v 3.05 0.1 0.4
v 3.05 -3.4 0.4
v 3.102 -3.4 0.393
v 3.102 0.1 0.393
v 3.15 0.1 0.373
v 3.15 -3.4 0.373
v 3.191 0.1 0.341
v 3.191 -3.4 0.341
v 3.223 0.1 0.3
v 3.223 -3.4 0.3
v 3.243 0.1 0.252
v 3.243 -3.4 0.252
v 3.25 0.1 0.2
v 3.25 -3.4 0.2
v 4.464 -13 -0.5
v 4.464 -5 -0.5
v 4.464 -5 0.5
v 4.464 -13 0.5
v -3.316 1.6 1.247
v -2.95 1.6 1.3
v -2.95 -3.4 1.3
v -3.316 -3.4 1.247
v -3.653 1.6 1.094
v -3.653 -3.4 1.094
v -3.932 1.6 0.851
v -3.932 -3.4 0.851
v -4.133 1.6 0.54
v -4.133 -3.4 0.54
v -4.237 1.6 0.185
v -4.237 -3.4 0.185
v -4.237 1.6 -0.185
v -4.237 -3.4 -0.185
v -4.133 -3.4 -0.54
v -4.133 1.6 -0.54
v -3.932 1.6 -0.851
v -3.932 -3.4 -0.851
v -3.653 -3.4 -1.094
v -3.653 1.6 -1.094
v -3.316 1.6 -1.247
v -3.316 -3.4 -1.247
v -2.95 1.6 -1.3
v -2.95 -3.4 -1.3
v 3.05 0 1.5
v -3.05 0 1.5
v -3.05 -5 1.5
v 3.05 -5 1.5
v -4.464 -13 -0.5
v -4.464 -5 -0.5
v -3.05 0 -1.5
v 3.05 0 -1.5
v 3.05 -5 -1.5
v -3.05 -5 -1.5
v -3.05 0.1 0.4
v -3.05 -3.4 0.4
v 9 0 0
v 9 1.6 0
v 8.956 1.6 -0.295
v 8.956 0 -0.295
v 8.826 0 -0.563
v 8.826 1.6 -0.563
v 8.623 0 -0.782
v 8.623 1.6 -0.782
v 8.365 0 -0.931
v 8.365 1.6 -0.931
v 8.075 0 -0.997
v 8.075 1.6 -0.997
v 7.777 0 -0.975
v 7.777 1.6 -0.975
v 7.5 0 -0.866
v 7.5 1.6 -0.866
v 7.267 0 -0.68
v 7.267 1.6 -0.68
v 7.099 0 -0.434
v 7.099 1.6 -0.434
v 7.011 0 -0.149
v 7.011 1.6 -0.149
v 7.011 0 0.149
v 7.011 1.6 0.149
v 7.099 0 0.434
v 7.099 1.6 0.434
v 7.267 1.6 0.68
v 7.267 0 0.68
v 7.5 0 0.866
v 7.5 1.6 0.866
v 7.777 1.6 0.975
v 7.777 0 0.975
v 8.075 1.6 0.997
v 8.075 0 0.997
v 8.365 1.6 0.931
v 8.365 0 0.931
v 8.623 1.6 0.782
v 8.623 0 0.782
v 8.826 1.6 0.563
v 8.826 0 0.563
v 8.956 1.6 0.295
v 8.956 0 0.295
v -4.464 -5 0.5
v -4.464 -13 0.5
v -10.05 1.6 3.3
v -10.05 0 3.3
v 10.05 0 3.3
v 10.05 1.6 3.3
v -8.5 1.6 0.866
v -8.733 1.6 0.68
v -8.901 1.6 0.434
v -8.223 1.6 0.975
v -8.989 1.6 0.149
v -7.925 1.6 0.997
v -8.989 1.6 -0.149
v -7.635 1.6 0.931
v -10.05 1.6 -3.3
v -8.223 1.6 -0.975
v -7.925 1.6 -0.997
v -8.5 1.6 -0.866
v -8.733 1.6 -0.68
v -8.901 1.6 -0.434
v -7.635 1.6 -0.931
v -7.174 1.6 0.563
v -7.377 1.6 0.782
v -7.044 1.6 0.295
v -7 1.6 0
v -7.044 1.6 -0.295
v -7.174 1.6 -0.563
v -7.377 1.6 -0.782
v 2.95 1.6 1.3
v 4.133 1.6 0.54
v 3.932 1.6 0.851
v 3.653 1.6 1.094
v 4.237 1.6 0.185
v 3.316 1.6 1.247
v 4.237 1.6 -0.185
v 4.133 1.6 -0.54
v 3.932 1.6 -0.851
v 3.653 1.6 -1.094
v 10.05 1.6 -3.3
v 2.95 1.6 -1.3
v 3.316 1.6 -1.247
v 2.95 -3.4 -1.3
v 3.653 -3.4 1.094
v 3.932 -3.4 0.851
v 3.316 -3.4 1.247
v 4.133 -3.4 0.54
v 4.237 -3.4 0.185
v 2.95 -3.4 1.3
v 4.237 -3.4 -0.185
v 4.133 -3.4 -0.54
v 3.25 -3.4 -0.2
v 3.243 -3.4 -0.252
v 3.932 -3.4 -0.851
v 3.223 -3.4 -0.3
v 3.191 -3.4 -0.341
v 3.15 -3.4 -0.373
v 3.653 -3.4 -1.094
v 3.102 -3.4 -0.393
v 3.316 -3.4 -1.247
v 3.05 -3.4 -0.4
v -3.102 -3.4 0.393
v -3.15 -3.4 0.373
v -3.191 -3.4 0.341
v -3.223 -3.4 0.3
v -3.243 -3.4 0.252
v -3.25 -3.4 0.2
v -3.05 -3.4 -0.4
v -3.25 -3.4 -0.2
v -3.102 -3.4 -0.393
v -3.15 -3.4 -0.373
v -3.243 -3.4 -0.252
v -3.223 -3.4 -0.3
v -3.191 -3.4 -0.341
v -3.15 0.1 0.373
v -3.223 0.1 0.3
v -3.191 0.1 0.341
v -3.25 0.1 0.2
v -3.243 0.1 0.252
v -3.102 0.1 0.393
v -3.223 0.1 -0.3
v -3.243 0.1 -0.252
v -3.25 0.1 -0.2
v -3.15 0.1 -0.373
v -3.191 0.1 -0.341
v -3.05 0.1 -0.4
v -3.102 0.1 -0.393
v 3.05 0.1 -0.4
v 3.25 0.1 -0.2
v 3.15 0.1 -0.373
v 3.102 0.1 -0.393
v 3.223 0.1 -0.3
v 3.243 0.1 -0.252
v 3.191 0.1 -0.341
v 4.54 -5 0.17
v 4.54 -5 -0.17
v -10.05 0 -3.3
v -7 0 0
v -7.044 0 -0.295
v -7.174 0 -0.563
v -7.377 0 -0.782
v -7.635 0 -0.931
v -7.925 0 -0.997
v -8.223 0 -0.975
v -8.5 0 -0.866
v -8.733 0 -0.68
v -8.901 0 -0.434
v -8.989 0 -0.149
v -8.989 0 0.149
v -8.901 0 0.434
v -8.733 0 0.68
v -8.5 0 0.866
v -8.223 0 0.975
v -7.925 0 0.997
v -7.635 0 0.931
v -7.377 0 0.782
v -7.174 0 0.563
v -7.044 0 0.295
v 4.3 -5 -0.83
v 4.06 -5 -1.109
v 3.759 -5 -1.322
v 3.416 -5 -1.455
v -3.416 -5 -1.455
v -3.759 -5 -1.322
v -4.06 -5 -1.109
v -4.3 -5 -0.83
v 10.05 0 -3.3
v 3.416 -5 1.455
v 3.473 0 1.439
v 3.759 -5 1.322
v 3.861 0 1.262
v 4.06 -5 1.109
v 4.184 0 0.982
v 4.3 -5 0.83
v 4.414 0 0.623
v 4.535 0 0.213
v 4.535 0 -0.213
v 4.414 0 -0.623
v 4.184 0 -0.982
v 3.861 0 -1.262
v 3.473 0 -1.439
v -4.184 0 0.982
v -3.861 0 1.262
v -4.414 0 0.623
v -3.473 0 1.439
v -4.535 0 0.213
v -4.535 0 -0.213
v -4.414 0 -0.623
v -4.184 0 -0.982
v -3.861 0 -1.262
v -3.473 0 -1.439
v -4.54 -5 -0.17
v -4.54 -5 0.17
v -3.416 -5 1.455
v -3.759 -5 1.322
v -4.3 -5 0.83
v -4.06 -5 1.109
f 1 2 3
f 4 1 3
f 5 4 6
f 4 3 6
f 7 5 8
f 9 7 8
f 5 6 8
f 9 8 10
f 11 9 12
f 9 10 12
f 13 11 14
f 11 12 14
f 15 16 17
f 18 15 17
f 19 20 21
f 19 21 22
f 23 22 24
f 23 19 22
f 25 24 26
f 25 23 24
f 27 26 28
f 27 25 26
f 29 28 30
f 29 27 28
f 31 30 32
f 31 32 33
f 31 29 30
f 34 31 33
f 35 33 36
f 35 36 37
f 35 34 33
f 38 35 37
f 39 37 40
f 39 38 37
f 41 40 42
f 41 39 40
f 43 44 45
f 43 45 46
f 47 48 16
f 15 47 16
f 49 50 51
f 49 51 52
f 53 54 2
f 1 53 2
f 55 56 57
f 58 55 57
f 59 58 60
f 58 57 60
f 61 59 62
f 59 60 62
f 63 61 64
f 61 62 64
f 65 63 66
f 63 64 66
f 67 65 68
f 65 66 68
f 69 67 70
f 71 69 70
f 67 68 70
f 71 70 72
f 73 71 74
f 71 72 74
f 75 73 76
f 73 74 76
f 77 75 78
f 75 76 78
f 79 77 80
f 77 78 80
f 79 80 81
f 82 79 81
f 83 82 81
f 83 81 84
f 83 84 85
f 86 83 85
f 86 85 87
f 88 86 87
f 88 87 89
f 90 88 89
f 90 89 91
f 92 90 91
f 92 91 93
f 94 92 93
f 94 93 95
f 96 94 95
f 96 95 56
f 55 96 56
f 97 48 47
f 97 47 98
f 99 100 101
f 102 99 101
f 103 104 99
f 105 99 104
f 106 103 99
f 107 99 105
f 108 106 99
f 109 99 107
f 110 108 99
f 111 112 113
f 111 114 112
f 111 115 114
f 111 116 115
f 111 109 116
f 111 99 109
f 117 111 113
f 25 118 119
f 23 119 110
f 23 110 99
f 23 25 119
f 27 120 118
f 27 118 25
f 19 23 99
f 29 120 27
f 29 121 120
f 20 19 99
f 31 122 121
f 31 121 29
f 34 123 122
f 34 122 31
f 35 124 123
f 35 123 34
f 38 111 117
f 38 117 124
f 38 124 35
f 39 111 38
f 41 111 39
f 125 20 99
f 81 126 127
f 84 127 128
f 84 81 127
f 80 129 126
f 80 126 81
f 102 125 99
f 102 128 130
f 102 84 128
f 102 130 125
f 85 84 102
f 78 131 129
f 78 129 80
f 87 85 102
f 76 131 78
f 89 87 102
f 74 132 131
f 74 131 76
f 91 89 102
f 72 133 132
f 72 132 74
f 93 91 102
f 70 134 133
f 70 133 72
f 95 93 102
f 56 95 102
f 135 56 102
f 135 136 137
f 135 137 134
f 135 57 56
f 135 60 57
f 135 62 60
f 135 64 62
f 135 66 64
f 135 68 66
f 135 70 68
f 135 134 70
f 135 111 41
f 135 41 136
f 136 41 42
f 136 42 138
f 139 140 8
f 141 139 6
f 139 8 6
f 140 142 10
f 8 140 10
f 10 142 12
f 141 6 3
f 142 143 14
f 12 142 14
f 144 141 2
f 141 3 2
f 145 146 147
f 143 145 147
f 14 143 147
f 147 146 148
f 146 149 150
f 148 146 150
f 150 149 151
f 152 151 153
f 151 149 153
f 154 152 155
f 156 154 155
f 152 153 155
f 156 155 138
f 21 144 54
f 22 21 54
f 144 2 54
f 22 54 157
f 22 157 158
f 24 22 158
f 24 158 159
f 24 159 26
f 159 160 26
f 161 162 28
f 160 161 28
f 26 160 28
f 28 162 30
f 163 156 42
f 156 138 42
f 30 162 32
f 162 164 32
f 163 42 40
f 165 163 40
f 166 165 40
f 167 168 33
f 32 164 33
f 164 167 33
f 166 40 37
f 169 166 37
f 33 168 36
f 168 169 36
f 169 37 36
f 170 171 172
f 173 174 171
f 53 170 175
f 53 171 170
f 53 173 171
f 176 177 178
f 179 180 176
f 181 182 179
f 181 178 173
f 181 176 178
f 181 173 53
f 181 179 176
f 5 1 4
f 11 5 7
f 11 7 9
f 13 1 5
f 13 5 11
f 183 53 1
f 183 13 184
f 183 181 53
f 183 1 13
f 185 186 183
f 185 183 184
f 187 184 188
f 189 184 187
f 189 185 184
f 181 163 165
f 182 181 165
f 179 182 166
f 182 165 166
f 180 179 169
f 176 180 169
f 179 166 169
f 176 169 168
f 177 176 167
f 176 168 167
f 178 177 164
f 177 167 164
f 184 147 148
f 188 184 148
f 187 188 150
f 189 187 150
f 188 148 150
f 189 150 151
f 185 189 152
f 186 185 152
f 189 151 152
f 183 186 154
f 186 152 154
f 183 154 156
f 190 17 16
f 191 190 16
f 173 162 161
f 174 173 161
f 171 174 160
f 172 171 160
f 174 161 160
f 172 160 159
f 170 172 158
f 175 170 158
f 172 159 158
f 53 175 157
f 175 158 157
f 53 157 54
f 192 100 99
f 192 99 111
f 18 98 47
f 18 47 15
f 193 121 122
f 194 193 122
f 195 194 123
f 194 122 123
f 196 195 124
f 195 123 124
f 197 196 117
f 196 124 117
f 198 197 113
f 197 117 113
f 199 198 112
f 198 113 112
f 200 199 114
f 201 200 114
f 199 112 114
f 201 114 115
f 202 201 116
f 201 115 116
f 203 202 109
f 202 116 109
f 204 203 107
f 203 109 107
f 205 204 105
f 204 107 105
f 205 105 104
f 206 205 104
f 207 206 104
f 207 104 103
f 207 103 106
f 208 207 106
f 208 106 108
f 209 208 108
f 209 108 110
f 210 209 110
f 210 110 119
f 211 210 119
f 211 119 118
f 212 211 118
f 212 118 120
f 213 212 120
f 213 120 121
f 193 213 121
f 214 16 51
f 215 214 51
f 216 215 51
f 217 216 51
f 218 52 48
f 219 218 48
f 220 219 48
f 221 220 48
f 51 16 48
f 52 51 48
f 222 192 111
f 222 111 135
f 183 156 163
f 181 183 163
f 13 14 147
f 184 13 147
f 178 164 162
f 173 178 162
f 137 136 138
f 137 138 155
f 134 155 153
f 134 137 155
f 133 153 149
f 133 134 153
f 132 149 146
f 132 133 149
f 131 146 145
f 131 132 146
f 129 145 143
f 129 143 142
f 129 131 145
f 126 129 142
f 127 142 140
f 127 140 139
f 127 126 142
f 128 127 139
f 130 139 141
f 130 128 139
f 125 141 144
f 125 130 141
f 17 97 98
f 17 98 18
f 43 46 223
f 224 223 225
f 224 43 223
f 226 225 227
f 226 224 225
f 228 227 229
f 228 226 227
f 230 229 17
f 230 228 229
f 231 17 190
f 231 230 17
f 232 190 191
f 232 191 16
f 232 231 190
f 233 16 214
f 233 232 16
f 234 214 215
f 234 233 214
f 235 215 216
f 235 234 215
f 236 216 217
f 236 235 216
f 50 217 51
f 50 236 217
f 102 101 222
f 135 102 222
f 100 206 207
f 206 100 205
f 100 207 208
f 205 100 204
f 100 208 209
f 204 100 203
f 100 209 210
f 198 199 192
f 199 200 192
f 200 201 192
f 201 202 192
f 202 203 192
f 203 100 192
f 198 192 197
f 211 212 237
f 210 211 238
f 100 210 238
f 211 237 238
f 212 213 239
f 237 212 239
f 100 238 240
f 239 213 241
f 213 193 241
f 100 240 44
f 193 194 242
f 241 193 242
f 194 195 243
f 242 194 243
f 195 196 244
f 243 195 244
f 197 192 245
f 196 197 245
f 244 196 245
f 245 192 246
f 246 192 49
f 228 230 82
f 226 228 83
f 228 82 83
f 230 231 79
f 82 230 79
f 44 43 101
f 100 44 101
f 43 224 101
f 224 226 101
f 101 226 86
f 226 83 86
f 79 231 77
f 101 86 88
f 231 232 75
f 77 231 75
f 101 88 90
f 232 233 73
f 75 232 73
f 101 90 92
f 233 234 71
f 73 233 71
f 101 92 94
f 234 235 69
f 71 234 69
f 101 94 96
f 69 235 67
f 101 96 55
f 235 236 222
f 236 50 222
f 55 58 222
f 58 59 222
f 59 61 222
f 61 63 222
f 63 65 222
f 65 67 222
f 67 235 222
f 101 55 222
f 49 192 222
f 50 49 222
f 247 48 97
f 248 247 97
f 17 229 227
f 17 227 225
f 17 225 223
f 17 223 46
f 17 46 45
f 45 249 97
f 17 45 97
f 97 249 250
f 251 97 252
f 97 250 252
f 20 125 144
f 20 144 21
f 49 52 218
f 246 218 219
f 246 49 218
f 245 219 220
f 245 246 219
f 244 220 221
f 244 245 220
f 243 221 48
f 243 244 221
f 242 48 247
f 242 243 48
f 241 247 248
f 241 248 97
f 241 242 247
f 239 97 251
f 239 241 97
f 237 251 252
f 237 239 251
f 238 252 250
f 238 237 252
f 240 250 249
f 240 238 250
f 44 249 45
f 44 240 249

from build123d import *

# Parameters (mm, degrees)
SKETCH_1_W          = 20.1
SKETCH_1_H          = 6.6
EXTRUDE_1_DEPTH     = 1.6
CUT_EXTRUDE_1_REACH = 3.6
SKETCH_2_R          = 1
EXTRUDE_2_DEPTH     = 5
SKETCH_4_W          = 8.928427124
SKETCH_4_H          = 1
EXTRUDE_3_DEPTH     = 8
CUT_EXTRUDE_2_DEPTH = 5
EXTRUDE_4_DEPTH     = 3.5


with BuildPart() as part:
    # 草图1 → 凸台-拉伸1 (new body)
    with BuildSketch(Plane(origin=(0, 0, 0), x_dir=(1, 0, 0), z_dir=(0, 1, 0))):
        Rectangle(SKETCH_1_W, SKETCH_1_H)
    extrude(amount=EXTRUDE_1_DEPTH)

    # 草图2 → 切除-拉伸1 (cut, up to next)
    with BuildSketch(Plane(origin=(0, 1.6, 0), x_dir=(1, 0, 0), z_dir=(0, 1, 0)), mode=Mode.PRIVATE) as cut_extrude_1_sk1:
        with Locations((8, 0)):
            Circle(SKETCH_2_R)
    cut_extrude_1_tool1 = extrude(cut_extrude_1_sk1.sketch, amount=-CUT_EXTRUDE_1_REACH, mode=Mode.PRIVATE) & part.part
    add(cut_extrude_1_tool1.solids().sort_by_distance((8, 1.6, 0))[0], mode=Mode.SUBTRACT)
    # 草图2 → 切除-拉伸1 (cut, up to next)
    with BuildSketch(Plane(origin=(0, 1.6, 0), x_dir=(1, 0, 0), z_dir=(0, 1, 0)), mode=Mode.PRIVATE) as cut_extrude_1_sk2:
        with Locations((-8, 0)):
            Circle(SKETCH_2_R)
    cut_extrude_1_tool2 = extrude(cut_extrude_1_sk2.sketch, amount=-CUT_EXTRUDE_1_REACH, mode=Mode.PRIVATE) & part.part
    add(cut_extrude_1_tool2.solids().sort_by_distance((-8, 1.6, 0))[0], mode=Mode.SUBTRACT)

    # 草图3 → 凸台-拉伸2 (add)
    with BuildSketch(Plane.XZ):
        with BuildLine():
            Line((-3.05, 1.5), (3.05, 1.5))
            ThreePointArc((3.05, 1.5), (4.55, 0), (3.05, -1.5))
            Line((3.05, -1.5), (-3.05, -1.5))
            ThreePointArc((-3.05, -1.5), (-4.55, 0), (-3.05, 1.5))
        make_face()
    extrude(amount=EXTRUDE_2_DEPTH)

    # 草图4 → 凸台-拉伸3 (add)
    with BuildSketch(Plane.XZ.offset(5)):
        Rectangle(SKETCH_4_W, SKETCH_4_H)
    extrude(amount=EXTRUDE_3_DEPTH)

    # 草图5 → 切除-拉伸2 (cut)
    with BuildSketch(Plane(origin=(0, 1.6, 0), x_dir=(1, 0, 0), z_dir=(0, 1, 0))):
        with BuildLine():
            Line((-2.95, 1.3), (2.95, 1.3))
            ThreePointArc((2.95, 1.3), (4.25, 0), (2.95, -1.3))
            Line((2.95, -1.3), (-2.95, -1.3))
            ThreePointArc((-2.95, -1.3), (-4.25, 0), (-2.95, 1.3))
        make_face()
    extrude(amount=-CUT_EXTRUDE_2_DEPTH, mode=Mode.SUBTRACT)

    # 草图6 → 凸台-拉伸4 (add)
    with BuildSketch(Plane(origin=(0, -3.4, 0), x_dir=(1, 0, 0), z_dir=(0, 1, 0))):
        with BuildLine():
            Line((-3.05, -0.4), (3.05, -0.4))
            ThreePointArc((3.05, -0.4), (3.191421356, -0.341421356), (3.25, -0.2))
            Line((3.25, -0.2), (3.25, 0.2))
            ThreePointArc((3.25, 0.2), (3.191421356, 0.341421356), (3.05, 0.4))
            Line((3.05, 0.4), (-3.05, 0.4))
            ThreePointArc((-3.05, 0.4), (-3.191421356, 0.341421356), (-3.25, 0.2))
            Line((-3.25, 0.2), (-3.25, -0.2))
            ThreePointArc((-3.25, -0.2), (-3.191421356, -0.341421356), (-3.05, -0.4))
        make_face()
    extrude(amount=EXTRUDE_4_DEPTH)


solid = part.part
